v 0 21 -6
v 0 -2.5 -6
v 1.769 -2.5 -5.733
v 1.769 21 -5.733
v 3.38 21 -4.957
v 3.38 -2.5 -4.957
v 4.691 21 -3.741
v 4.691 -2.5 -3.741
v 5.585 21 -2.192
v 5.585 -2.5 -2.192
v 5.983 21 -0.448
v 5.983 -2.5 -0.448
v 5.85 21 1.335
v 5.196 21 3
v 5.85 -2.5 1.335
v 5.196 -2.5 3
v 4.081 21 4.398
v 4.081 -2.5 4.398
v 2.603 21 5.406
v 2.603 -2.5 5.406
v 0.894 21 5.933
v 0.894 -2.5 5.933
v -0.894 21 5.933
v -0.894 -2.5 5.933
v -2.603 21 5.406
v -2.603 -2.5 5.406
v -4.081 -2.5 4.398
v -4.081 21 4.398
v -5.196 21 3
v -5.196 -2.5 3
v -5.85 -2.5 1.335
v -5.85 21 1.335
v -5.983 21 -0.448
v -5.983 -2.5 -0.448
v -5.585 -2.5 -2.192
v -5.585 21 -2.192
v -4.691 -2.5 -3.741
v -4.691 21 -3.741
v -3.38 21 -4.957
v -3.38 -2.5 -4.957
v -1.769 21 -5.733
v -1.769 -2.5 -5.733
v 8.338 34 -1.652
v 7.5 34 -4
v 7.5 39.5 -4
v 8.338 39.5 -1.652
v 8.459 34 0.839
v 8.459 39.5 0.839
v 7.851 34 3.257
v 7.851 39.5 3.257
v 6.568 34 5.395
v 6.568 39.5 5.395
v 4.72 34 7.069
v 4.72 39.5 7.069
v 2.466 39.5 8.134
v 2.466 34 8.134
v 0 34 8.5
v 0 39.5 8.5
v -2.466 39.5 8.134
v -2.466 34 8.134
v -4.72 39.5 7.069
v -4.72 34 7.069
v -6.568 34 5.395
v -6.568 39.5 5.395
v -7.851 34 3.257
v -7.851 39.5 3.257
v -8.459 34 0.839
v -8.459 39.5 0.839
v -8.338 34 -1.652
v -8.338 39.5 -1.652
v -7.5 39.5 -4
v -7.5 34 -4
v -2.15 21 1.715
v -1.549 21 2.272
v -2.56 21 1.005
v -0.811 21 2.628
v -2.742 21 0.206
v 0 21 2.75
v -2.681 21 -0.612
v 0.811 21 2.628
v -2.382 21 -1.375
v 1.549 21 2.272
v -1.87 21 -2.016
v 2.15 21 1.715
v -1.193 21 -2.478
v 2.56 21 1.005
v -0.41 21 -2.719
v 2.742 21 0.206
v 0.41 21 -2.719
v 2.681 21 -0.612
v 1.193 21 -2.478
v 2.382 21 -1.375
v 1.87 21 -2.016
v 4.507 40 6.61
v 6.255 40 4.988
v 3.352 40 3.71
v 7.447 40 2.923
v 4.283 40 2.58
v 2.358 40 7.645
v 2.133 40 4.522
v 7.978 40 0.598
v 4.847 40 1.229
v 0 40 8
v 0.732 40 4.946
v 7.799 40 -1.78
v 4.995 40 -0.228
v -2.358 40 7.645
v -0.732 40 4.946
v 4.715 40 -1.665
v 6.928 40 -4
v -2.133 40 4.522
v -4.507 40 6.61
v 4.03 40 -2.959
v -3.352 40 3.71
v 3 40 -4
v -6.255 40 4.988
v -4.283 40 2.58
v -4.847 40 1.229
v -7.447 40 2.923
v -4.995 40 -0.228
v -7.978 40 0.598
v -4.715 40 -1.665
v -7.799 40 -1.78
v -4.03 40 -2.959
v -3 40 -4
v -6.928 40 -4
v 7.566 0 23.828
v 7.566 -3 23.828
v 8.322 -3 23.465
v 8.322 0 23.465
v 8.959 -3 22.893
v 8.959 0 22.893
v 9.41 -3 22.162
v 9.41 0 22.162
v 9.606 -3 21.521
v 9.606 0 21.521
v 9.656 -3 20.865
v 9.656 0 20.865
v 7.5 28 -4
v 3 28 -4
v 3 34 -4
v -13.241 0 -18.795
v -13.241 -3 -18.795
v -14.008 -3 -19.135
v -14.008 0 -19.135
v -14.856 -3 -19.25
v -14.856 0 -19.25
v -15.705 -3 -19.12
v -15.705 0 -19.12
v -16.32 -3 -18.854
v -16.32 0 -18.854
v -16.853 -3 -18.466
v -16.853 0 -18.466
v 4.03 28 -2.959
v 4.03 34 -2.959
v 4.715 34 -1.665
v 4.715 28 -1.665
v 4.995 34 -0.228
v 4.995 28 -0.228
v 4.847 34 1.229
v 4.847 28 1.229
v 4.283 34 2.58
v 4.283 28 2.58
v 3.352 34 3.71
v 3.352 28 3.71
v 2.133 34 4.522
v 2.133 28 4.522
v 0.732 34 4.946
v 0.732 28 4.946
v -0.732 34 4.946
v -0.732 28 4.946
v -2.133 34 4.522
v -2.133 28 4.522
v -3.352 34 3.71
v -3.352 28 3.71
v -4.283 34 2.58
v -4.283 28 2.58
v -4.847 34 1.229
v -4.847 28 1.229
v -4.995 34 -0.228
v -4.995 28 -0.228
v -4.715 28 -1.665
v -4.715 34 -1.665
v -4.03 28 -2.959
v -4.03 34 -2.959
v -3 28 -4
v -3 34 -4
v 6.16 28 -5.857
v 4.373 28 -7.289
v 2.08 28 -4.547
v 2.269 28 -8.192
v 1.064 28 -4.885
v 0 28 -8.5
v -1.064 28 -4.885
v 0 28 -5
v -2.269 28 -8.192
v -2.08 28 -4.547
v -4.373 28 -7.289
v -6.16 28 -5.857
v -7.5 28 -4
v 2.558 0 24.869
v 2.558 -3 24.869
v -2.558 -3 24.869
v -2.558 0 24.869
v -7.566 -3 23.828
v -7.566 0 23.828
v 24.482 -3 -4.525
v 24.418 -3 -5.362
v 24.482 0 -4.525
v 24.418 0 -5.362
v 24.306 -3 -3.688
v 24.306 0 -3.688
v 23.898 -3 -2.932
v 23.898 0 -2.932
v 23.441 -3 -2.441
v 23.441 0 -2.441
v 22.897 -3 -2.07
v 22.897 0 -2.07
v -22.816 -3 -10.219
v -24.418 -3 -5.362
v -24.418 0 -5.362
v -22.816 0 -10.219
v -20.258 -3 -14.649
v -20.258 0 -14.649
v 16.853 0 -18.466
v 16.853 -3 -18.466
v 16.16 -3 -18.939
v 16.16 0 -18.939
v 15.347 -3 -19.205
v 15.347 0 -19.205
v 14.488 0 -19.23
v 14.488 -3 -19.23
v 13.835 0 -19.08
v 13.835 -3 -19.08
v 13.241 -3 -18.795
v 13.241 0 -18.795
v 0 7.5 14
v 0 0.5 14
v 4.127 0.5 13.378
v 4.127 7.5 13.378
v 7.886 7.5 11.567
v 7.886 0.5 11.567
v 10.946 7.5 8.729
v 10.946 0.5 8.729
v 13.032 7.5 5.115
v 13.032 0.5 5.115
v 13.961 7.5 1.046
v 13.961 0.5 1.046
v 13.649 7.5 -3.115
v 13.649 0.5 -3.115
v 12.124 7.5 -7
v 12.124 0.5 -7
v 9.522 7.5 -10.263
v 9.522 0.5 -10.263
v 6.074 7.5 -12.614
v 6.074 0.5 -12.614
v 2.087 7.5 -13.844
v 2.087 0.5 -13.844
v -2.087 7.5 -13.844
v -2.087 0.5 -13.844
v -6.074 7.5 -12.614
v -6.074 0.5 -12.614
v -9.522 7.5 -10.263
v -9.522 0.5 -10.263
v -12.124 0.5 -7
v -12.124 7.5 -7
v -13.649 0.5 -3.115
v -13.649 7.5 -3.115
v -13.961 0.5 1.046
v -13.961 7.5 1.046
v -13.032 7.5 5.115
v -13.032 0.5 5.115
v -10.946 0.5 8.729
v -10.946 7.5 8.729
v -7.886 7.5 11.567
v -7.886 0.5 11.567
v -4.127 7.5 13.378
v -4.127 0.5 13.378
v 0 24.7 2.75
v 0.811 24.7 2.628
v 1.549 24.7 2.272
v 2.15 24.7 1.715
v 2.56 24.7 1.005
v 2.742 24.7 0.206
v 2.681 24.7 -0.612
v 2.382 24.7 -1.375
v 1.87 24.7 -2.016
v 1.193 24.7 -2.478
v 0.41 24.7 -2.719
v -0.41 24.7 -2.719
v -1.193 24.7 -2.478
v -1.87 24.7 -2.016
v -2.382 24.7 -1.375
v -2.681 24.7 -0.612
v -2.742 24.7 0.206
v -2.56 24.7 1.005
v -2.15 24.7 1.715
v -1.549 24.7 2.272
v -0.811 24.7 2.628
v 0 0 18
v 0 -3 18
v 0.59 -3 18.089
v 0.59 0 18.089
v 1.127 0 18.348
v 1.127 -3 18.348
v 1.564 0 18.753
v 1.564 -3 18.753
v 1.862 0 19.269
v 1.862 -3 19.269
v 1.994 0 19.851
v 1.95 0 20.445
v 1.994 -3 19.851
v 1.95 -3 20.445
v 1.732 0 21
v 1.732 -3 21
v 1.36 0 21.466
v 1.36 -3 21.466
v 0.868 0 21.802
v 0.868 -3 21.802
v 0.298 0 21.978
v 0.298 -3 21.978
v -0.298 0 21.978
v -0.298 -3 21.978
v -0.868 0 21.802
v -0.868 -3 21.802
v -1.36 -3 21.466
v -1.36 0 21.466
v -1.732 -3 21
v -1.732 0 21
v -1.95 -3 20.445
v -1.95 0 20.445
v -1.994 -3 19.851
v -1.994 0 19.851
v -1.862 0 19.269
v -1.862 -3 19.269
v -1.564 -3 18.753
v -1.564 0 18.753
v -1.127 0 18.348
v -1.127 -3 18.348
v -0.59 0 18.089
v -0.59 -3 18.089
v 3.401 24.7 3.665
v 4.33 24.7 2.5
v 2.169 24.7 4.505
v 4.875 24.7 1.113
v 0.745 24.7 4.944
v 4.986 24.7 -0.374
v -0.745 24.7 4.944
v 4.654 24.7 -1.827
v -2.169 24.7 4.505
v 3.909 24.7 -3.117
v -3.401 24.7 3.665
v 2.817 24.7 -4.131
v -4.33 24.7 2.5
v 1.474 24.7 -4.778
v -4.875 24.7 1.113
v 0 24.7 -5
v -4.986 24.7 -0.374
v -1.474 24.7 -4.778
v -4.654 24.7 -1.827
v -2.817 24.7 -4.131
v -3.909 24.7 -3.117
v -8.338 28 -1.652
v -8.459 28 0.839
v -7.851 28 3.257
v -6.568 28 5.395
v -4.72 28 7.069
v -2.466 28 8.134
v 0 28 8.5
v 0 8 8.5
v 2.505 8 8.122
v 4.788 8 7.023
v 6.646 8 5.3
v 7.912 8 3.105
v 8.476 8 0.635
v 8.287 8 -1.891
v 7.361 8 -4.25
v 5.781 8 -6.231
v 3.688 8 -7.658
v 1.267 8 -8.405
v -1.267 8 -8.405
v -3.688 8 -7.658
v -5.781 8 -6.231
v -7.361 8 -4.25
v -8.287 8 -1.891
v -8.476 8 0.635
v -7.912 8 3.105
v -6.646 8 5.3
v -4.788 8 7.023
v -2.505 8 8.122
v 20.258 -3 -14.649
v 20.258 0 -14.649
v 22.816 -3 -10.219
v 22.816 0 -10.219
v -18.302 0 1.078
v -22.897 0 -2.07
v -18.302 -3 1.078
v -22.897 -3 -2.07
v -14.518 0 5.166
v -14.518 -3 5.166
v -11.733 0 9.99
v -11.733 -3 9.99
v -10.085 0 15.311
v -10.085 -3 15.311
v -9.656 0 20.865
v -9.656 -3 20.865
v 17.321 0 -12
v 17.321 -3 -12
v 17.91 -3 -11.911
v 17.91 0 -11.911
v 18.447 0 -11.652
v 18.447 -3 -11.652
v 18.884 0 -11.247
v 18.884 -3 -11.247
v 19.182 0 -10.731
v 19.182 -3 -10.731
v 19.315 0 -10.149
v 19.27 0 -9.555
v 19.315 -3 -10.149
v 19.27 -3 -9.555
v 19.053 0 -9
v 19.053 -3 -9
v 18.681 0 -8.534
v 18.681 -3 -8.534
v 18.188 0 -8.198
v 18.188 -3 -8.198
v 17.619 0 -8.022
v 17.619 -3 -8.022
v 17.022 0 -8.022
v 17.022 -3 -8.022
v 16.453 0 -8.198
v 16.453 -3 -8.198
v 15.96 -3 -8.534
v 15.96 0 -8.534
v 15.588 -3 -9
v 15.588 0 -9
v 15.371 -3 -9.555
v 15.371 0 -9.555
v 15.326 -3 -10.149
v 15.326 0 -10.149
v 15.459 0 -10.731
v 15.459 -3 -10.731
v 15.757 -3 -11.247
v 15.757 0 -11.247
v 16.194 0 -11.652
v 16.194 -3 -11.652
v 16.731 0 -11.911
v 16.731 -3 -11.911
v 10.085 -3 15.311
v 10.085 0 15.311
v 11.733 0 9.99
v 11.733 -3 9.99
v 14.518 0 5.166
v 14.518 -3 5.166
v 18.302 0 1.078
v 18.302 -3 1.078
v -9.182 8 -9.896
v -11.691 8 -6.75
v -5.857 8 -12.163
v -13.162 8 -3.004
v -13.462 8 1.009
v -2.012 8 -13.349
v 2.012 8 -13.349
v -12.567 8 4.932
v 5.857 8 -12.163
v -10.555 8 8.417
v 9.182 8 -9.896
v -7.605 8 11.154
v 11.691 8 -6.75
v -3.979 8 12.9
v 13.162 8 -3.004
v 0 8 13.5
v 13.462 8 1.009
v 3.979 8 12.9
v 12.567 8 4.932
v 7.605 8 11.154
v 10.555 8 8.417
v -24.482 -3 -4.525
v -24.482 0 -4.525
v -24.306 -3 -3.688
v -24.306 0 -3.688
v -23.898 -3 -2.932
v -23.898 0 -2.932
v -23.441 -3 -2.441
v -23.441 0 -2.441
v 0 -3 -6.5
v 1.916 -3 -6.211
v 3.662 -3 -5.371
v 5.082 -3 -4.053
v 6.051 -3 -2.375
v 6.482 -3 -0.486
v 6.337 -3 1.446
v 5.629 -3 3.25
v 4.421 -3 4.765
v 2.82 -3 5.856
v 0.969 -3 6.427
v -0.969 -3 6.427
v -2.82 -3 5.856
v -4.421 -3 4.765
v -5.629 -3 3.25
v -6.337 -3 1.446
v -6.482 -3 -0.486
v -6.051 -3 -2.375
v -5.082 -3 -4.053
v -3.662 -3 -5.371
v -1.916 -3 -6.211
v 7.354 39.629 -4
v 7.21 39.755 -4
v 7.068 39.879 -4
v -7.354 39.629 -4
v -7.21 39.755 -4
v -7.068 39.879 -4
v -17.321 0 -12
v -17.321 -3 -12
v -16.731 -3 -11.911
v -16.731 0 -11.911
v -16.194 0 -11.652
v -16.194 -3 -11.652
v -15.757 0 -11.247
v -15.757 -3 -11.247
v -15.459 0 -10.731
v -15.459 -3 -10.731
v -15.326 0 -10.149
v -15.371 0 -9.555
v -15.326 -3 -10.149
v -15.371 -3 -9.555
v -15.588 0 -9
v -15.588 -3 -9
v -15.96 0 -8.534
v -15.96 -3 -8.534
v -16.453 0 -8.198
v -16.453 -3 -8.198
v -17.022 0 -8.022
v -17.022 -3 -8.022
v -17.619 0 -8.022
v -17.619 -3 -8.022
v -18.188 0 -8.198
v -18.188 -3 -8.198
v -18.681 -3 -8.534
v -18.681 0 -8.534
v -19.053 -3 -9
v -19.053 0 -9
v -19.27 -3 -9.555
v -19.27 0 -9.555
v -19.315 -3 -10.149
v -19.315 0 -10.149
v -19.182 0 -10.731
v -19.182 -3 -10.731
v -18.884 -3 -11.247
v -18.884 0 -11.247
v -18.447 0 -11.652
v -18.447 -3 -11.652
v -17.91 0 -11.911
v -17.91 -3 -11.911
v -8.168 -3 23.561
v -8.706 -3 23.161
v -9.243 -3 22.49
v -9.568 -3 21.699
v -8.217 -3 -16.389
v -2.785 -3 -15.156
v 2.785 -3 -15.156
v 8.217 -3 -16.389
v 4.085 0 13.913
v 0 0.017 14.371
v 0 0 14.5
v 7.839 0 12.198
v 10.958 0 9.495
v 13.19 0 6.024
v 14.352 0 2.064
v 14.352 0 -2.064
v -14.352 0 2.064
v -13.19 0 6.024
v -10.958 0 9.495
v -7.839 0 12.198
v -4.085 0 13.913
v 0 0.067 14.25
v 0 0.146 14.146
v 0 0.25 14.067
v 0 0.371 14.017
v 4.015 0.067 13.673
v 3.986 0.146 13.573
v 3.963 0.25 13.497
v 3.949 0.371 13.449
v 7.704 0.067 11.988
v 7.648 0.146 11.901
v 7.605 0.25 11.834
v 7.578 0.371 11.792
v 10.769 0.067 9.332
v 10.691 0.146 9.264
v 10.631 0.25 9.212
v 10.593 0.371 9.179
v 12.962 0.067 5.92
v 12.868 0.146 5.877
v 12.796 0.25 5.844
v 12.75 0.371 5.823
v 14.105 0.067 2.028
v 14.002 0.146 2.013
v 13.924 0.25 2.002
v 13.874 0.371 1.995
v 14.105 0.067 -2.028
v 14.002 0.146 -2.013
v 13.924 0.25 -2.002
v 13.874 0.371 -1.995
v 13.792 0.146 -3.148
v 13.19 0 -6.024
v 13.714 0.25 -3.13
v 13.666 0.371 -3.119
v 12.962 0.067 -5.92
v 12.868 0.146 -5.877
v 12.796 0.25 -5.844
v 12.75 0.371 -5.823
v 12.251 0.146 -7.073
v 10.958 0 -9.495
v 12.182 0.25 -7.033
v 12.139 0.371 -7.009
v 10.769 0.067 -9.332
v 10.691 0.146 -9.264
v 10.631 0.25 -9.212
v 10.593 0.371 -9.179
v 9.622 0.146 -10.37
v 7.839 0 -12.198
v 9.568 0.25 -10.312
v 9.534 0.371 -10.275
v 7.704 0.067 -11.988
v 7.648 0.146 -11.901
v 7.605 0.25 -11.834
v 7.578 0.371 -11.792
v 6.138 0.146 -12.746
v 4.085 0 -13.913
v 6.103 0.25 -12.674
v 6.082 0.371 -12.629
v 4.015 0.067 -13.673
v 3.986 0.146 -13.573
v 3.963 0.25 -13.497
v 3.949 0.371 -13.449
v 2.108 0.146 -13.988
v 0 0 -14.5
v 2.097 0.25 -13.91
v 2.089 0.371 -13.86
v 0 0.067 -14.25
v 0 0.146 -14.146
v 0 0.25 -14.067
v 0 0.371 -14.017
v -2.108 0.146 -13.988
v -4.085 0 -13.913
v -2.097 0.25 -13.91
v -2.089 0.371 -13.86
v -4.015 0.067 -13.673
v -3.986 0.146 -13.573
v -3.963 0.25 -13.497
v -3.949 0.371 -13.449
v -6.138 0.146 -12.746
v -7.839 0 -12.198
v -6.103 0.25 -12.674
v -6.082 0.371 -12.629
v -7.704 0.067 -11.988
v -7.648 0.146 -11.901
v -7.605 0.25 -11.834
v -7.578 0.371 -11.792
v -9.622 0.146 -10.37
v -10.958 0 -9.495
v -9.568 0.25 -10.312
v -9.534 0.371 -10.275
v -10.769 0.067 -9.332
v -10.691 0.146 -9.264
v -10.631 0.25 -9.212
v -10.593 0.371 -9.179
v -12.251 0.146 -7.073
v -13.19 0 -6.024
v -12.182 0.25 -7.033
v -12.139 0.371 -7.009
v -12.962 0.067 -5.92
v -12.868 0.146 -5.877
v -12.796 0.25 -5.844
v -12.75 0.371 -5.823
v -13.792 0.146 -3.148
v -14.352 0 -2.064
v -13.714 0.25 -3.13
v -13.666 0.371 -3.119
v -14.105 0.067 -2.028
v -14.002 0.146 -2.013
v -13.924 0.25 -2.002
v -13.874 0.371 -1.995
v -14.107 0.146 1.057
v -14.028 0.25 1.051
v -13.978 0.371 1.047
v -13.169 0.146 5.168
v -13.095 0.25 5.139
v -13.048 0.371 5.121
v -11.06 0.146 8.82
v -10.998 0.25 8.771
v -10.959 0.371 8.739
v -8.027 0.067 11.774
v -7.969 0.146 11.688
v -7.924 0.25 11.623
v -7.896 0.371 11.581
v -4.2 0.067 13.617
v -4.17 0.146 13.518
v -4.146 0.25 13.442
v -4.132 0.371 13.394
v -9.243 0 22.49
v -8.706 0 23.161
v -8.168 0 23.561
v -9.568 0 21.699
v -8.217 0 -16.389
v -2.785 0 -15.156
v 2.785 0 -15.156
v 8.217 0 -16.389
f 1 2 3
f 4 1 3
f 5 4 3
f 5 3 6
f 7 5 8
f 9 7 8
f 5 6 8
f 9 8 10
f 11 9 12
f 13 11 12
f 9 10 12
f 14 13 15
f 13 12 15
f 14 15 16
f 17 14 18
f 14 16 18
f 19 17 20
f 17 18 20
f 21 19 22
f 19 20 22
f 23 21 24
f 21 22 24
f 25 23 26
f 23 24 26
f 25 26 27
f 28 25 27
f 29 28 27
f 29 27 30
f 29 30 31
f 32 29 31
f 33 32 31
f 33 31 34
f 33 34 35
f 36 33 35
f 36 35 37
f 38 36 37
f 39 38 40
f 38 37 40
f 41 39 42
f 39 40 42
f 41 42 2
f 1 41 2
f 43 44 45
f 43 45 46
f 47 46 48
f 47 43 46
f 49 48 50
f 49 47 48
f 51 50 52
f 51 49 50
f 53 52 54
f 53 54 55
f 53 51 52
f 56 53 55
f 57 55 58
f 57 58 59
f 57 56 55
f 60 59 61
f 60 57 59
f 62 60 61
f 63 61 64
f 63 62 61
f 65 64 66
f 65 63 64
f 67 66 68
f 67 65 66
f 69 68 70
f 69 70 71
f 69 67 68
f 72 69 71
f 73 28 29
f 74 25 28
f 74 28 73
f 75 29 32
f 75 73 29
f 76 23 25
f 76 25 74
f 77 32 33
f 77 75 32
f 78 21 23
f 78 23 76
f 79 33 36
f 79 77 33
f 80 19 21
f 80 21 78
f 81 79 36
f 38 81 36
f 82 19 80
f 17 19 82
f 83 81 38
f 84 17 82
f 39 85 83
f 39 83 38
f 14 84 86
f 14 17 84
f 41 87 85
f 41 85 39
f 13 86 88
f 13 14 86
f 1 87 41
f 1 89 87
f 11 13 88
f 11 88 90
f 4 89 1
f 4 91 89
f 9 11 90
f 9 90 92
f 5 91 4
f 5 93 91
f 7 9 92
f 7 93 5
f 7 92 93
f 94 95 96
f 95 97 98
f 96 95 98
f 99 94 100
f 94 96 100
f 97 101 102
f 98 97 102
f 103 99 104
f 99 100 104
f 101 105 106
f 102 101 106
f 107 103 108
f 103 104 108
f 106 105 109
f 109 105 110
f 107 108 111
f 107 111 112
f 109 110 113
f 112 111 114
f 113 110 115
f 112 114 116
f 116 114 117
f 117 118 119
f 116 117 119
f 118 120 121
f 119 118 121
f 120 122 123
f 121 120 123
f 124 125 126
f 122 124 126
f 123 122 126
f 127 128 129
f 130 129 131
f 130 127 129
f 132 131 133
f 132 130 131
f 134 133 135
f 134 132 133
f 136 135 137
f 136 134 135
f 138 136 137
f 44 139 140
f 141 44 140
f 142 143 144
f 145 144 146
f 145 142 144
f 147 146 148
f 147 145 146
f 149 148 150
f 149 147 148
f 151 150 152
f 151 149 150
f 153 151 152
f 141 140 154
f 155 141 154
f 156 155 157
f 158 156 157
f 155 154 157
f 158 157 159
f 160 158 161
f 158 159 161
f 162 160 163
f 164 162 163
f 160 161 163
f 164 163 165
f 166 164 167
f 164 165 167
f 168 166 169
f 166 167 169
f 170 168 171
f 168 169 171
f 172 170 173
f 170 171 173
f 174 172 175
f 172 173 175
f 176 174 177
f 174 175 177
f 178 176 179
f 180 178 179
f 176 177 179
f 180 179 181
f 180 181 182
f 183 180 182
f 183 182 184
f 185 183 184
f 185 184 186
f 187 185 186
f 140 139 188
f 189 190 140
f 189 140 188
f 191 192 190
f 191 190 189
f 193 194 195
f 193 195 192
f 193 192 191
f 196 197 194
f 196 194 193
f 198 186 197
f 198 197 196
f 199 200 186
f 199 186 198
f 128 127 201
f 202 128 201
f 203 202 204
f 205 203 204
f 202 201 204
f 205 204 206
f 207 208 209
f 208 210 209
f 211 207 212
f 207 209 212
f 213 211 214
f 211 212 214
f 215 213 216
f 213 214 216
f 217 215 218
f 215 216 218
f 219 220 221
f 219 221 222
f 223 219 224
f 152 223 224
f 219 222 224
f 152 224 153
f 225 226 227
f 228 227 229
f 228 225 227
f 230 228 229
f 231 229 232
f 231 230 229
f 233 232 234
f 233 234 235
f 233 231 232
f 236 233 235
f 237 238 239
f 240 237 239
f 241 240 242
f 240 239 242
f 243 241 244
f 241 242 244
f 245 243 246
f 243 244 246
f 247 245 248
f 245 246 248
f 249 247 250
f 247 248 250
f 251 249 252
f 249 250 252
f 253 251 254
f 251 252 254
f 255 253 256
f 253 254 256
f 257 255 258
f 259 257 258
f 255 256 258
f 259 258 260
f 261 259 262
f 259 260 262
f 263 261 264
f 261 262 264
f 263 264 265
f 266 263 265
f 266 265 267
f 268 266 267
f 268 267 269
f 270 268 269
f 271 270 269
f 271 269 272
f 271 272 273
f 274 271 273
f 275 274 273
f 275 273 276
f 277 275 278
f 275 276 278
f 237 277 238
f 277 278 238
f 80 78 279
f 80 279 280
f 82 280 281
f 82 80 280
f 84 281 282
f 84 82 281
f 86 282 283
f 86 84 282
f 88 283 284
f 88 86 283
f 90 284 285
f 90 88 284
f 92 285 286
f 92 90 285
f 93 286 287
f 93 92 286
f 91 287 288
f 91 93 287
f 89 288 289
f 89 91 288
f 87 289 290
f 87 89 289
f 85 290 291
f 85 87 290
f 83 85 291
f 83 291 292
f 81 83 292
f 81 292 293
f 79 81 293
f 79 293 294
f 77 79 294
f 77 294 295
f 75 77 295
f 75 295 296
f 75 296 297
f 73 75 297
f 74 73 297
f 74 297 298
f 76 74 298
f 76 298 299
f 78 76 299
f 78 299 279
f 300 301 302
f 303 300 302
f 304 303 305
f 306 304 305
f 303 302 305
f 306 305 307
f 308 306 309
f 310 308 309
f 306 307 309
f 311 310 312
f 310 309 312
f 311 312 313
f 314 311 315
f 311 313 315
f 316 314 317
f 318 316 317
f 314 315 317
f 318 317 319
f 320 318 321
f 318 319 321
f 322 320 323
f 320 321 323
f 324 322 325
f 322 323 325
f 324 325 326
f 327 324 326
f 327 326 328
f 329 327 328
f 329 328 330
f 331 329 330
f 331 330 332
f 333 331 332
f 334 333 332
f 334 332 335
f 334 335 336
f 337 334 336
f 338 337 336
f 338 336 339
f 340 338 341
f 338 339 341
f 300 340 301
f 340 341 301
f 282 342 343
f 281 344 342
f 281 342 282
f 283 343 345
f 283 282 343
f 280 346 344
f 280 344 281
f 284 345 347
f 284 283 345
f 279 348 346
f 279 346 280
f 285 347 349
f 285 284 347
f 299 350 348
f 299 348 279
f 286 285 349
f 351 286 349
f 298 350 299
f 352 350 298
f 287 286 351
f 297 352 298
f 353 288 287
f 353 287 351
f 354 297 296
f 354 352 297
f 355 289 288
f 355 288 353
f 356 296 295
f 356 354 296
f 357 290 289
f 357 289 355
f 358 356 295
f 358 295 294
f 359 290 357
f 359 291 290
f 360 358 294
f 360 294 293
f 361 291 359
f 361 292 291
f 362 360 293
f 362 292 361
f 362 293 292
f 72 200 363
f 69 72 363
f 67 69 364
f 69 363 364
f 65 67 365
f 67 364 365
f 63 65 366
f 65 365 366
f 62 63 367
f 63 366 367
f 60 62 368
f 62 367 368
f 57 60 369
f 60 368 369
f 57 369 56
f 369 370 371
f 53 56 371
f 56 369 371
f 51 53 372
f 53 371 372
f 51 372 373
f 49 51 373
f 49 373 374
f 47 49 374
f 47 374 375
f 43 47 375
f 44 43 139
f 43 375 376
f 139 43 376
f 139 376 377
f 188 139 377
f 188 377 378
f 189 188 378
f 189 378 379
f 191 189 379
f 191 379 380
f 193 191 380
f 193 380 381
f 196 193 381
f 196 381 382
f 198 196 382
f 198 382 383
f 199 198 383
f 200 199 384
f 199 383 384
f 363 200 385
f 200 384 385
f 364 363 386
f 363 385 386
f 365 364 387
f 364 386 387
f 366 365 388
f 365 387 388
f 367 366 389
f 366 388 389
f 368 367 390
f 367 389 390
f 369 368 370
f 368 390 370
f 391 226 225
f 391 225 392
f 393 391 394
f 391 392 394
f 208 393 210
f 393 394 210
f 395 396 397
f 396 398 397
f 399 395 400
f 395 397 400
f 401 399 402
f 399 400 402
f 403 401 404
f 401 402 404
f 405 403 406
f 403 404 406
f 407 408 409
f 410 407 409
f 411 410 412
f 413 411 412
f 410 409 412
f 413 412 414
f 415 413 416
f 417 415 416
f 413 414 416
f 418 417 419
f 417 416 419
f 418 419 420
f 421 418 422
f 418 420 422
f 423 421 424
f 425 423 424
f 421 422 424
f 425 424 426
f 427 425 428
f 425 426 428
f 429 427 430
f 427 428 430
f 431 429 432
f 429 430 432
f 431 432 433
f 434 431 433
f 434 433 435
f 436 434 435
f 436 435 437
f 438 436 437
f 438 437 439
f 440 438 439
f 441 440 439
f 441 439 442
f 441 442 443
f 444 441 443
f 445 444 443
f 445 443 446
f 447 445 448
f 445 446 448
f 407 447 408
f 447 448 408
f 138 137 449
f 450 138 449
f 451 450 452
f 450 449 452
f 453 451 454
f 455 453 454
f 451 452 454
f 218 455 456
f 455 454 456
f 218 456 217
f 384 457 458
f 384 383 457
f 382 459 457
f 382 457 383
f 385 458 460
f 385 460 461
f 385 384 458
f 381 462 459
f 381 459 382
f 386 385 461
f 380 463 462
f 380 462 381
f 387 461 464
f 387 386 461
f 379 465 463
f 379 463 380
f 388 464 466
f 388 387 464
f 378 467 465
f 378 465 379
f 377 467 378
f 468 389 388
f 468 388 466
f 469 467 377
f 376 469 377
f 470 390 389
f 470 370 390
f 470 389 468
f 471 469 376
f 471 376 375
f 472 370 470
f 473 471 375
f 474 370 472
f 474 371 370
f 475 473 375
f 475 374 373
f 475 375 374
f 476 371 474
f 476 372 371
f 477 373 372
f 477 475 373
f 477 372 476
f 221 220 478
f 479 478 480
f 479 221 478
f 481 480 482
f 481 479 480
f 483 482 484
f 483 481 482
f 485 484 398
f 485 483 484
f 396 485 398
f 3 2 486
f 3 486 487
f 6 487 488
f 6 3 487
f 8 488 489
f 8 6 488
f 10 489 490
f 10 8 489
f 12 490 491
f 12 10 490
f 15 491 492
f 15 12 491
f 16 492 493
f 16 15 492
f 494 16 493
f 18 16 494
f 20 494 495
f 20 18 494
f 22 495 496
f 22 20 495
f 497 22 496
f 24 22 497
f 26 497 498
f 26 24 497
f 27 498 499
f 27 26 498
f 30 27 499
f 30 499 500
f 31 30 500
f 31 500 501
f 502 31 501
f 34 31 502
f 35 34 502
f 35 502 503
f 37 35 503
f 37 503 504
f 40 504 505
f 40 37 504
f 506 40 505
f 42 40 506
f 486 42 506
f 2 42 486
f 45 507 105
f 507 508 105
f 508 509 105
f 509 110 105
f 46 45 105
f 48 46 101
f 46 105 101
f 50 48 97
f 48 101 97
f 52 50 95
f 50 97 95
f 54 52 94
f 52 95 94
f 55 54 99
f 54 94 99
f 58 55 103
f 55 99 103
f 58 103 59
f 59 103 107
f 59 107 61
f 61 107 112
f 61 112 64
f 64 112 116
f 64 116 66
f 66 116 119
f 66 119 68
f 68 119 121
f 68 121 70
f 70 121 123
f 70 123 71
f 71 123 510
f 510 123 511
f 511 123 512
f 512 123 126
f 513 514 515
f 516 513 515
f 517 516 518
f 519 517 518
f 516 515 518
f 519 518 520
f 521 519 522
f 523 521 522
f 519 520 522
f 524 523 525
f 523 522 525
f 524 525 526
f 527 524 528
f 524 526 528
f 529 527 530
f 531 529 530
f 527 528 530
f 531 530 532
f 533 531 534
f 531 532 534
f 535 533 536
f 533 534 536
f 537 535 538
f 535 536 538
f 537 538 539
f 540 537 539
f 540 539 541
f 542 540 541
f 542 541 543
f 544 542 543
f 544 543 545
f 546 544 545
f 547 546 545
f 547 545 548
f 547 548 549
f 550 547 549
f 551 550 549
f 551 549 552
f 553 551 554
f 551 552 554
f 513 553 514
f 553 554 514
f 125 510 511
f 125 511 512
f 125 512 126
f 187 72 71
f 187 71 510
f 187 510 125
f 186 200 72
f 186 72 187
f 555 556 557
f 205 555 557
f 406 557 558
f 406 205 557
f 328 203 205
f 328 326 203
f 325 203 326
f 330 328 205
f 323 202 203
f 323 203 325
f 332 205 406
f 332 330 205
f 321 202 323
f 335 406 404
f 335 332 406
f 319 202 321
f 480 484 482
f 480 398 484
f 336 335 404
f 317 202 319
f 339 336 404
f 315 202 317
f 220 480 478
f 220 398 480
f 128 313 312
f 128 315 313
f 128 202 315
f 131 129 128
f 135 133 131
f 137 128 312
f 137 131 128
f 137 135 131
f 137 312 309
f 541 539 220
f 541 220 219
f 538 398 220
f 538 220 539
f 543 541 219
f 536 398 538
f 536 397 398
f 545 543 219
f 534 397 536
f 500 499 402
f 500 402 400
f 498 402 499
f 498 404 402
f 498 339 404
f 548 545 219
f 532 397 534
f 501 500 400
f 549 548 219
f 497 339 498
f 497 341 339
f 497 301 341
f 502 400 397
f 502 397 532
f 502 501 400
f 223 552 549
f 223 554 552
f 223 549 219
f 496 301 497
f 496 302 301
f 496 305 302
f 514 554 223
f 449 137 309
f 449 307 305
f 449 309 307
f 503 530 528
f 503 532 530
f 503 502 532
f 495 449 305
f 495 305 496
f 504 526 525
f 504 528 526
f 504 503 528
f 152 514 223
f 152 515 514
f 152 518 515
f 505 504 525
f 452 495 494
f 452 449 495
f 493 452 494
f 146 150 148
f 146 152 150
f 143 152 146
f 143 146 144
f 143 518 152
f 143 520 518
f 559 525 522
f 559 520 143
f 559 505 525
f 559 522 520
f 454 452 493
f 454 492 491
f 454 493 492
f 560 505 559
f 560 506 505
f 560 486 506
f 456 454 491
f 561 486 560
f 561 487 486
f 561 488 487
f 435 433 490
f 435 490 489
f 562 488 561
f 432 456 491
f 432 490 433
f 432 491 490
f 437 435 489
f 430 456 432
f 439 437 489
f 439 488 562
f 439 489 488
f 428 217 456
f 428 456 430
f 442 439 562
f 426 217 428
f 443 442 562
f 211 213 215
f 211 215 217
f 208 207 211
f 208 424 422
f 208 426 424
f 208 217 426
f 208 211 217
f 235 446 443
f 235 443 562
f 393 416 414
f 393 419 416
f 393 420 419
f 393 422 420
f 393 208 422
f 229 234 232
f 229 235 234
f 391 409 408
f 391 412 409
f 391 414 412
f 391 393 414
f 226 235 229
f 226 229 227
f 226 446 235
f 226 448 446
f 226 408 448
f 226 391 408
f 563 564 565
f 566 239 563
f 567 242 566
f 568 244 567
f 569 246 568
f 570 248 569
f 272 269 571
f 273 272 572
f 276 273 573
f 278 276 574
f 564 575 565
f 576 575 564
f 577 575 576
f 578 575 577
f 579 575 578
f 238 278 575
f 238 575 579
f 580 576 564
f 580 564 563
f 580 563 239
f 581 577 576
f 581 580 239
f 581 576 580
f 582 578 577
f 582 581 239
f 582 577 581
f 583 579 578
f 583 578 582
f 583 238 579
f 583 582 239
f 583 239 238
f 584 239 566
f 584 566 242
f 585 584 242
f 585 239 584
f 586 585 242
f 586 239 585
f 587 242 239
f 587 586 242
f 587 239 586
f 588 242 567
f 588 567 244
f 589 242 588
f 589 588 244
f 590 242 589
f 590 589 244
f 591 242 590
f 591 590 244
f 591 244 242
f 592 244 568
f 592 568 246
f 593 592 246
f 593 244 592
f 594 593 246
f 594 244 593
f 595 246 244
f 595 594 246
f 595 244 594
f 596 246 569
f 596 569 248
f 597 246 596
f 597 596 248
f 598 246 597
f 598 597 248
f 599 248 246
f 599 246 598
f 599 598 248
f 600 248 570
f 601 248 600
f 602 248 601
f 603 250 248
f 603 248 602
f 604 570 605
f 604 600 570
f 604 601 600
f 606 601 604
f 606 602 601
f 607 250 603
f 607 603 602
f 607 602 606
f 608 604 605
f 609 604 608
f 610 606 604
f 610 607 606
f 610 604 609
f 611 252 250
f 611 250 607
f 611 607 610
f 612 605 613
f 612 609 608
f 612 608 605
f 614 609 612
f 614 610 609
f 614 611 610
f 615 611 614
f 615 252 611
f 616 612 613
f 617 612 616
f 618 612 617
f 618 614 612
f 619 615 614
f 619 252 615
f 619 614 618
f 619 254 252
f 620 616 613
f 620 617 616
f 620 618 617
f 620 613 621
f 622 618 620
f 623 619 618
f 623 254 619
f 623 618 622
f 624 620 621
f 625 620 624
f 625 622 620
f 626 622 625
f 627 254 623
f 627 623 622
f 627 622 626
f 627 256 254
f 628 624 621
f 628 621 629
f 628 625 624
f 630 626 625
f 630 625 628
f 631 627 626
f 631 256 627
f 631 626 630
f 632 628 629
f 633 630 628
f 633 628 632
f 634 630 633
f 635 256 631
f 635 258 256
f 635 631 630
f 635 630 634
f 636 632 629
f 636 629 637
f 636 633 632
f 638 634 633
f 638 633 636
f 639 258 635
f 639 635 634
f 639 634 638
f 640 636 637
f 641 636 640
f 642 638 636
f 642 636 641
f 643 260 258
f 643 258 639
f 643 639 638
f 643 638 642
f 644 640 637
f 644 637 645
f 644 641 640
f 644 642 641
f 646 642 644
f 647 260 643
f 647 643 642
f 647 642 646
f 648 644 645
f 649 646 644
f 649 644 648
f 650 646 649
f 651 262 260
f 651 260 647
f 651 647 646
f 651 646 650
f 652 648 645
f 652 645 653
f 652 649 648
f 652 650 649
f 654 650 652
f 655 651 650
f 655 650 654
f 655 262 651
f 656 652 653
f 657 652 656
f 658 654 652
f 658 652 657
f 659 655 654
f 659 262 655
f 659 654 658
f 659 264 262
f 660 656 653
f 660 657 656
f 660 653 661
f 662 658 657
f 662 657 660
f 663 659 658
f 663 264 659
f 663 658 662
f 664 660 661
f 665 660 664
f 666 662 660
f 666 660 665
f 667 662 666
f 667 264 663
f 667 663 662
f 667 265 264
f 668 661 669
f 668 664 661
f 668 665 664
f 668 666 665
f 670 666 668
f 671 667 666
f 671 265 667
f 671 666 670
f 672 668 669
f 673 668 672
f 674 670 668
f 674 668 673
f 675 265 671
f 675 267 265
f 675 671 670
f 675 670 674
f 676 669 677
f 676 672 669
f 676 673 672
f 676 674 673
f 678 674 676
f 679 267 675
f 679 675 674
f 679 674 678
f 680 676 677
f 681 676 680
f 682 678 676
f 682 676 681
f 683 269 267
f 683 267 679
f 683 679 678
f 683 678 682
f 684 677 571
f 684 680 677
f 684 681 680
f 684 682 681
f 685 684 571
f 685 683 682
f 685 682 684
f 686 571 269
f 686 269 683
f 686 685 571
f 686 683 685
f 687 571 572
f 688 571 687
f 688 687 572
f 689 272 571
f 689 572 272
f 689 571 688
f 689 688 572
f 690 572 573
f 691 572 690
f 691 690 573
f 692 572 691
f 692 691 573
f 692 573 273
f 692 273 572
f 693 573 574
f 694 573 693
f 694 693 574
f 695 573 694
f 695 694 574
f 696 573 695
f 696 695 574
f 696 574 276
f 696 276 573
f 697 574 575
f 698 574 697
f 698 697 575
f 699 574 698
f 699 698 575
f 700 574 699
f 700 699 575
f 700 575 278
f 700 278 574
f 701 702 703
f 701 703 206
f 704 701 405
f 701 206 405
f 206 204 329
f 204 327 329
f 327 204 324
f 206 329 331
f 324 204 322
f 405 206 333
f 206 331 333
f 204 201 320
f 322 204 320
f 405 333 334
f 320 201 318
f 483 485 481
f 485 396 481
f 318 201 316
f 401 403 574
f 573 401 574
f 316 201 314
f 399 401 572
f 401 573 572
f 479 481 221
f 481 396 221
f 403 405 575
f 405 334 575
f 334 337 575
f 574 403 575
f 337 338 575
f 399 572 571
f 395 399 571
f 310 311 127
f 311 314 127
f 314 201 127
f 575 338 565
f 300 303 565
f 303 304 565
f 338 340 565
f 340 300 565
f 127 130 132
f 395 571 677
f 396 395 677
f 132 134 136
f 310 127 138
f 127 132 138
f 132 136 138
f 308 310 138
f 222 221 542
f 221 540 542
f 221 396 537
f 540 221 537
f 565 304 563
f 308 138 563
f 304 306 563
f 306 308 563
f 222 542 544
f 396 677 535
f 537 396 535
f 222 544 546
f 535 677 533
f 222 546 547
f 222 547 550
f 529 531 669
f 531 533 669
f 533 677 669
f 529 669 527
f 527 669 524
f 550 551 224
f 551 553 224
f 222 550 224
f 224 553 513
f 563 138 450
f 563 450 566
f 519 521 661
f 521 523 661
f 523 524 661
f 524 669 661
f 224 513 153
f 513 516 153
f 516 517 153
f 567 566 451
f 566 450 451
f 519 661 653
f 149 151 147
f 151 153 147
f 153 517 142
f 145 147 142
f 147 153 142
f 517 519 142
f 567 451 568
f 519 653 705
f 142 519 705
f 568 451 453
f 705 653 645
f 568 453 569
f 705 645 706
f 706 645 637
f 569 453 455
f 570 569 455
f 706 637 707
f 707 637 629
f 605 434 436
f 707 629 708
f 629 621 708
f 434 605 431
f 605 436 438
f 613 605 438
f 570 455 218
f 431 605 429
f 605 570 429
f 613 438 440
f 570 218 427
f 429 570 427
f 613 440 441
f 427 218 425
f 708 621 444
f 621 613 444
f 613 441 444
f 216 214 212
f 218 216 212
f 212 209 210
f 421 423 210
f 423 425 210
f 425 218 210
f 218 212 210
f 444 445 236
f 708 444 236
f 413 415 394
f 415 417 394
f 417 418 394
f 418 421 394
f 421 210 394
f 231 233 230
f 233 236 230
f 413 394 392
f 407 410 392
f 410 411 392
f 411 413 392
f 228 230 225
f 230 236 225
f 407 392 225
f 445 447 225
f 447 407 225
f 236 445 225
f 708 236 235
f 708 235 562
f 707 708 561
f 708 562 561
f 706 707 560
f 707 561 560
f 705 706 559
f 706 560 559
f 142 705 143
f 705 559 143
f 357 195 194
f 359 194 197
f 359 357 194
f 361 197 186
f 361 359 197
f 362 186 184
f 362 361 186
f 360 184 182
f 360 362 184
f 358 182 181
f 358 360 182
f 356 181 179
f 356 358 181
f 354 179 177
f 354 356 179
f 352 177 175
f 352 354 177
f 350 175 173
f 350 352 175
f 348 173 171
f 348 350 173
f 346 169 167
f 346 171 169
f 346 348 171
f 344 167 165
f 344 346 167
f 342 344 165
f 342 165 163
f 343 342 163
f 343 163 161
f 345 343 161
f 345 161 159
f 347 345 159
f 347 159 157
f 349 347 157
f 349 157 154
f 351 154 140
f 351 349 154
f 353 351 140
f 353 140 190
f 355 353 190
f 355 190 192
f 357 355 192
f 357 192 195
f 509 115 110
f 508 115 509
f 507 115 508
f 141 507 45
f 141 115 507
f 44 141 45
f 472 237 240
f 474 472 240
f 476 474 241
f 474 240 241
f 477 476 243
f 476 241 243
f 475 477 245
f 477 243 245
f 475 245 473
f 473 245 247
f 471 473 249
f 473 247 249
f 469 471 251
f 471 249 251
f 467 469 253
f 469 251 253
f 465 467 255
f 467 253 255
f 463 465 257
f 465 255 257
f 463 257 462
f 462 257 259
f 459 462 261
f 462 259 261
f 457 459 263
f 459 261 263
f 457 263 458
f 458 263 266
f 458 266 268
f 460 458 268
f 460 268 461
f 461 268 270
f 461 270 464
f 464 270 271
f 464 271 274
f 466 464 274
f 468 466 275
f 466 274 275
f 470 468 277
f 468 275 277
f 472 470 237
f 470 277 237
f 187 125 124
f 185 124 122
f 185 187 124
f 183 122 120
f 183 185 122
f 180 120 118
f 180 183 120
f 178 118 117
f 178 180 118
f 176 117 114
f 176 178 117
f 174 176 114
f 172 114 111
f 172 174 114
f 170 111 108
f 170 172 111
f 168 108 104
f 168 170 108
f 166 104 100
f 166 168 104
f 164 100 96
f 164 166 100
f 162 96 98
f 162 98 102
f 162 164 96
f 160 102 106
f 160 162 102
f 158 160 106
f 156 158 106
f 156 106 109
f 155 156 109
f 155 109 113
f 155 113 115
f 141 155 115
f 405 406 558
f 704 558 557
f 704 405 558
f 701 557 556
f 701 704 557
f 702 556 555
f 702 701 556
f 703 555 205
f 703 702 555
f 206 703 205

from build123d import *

# Parameters (mm, degrees)
SKETCH_2_R          = 14
EXTRUDE_1_DEPTH     = 8
SKETCH_3_R          = 8.5
EXTRUDE_2_DEPTH     = 20
SKETCH_4_R          = 5
CUT_EXTRUDE_1_DEPTH = 45
EXTRUDE_START       = -7
SKETCH_5_R          = 5
SKETCH_5_R_2        = 2.75
EXTRUDE_3_DEPTH     = 7
CUT_EXTRUDE_START   = -3.3
SKETCH_6_R          = 5
SKETCH_6_R_2        = 2.75
CUT_EXTRUDE_2_DEPTH = 3.3
EXTRUDE_4_DEPTH     = 6
SKETCH_9_R          = 6
CUT_EXTRUDE_5_DEPTH = 21
CHAMFER_5_SIZE      = 0.5
SKETCH_21_R         = 25
EXTRUDE_5_DEPTH     = 3
SKETCH_22_R         = 2.0000000000000004
SKETCH_22_R_2       = 25
SKETCH_22_R_3       = 2.0000000000000027
SKETCH_22_R_4       = 1.9999999999999996
SKETCH_22_R_5       = 25.000000000000004
CUT_EXTRUDE_7_DEPTH = 3
FILLET_2_R          = 3
FILLET_3_R          = 0.5
SKETCH_23_R         = 6
CUT_EXTRUDE_8_DEPTH = 3
CHAMFER_7_SIZE      = 0.5
EXTRUDE_6_DEPTH     = 6
CHAMFER_8_SIZE      = 0.5


with BuildPart() as part:
    # 草图2 → 凸台-拉伸1 (new body)
    with BuildSketch(Plane(origin=(0, 0, 0), x_dir=(1, 0, 0), z_dir=(0, 1, 0))):
        Circle(SKETCH_2_R)
    extrude(amount=EXTRUDE_1_DEPTH)

    # 草图3 → 凸台-拉伸2 (add)
    with BuildSketch(Plane(origin=(0, 8, 0), x_dir=(1, 0, 0), z_dir=(0, 1, 0))):
        Circle(SKETCH_3_R)
    extrude(amount=EXTRUDE_2_DEPTH)

    # 草图4 → 切除-拉伸1 (cut)
    with BuildSketch(Plane.XZ):
        Circle(SKETCH_4_R)
    extrude(amount=-CUT_EXTRUDE_1_DEPTH, mode=Mode.SUBTRACT)

    # 草图5 → 凸台-拉伸3 (add)
    with BuildSketch(Plane(origin=(0, 28, 0), x_dir=(1, 0, 0), z_dir=(0, 1, 0)).offset(EXTRUDE_START)):
        Circle(SKETCH_5_R)
        Circle(SKETCH_5_R_2, mode=Mode.SUBTRACT)
    extrude(amount=EXTRUDE_3_DEPTH)

    # 草图6 → 切除-拉伸2 (cut)
    with BuildSketch(Plane(origin=(0, 28, 0), x_dir=(1, 0, 0), z_dir=(0, 1, 0)).offset(CUT_EXTRUDE_START)):
        Circle(SKETCH_6_R)
        Circle(SKETCH_6_R_2, mode=Mode.SUBTRACT)
    extrude(amount=CUT_EXTRUDE_2_DEPTH, mode=Mode.SUBTRACT)

    # 草图8 → 凸台-拉伸4 (add)
    with BuildSketch(Plane(origin=(0, 28, 0), x_dir=(1, 0, 0), z_dir=(0, 1, 0))):
        with BuildLine():
            Line((-3.000000000000001, 4), (-7.500000000000001, 4))
            ThreePointArc((-7.500000000000001, 4), (8.9e-16, -8.5), (7.5, 4.000000000000002))
            Line((7.500000000000001, 4), (3.0000000000000027, 4))
            ThreePointArc((3.0000000000000018, 3.9999999999999982), (4.4721359549995805, 2.236067977499788), (5, -2.16e-15))
            ThreePointArc((5, -2.16e-15), (-2.2360679774997885, -4.472135954999579), (-3.000000000000001, 3.999999999999998))
        make_face()
    extrude(amount=EXTRUDE_4_DEPTH)

    # 草图9 → 切除-拉伸5 (cut)
    with BuildSketch(Plane.XZ):
        Circle(SKETCH_9_R)
    extrude(amount=-CUT_EXTRUDE_5_DEPTH, mode=Mode.SUBTRACT)

    # 倒角5
    chamfer_5_edges = [part.edges().sort_by_distance(p)[0] for p in [
        (-14, 8, -1.71e-15),
    ]]
    chamfer(chamfer_5_edges, length=CHAMFER_5_SIZE)

    # 草图21 → 凸台-拉伸5 (add)
    with BuildSketch(Plane.XZ):
        Circle(SKETCH_21_R)
    extrude(amount=EXTRUDE_5_DEPTH)

    # 草图22 → 切除-拉伸7 (cut)
    with BuildSketch(Plane.XZ.offset(3)):
        with Locations((0, 20)):
            Circle(SKETCH_22_R)
        with Locations((0, -40)):
            Circle(SKETCH_22_R_2)
        with Locations((17.320508075688732, -10.00000000000008)):
            Circle(SKETCH_22_R_3)
        with Locations((-34.641016151377464, 20.000000000000163)):
            Circle(SKETCH_22_R_2)
        with Locations((-17.32050807568886, -9.999999999999838)):
            Circle(SKETCH_22_R_4)
        with Locations((34.64101615137774, 19.999999999999677)):
            Circle(SKETCH_22_R_5)
    extrude(amount=-CUT_EXTRUDE_7_DEPTH, mode=Mode.SUBTRACT)

    # 圆角2
    fillet_2_edges = [part.edges().sort_by_distance(p)[0] for p in [
        (-24.820508075688785, -1.5, -2.9903810567664557),
        (-14.999999999999996, -1.5, -20),
        (14.999999999999996, -1.5, -20),
        (24.820508075688743, -1.5, -2.990381056766811),
        (9.820508075688991, -1.5, 22.990381056766484),
        (-9.820508075688677, -1.5, 22.99038105676662),
    ]]
    fillet(fillet_2_edges, radius=FILLET_2_R)

    # 圆角3
    fillet_3_edges = [part.edges().sort_by_distance(p)[0] for p in [
        (-14, 0, -1.71e-15),
    ]]
    fillet(fillet_3_edges, radius=FILLET_3_R)

    # 草图23 → 切除-拉伸8 (cut)
    with BuildSketch(Plane.XZ.offset(3)):
        Circle(SKETCH_23_R)
    extrude(amount=-CUT_EXTRUDE_8_DEPTH, mode=Mode.SUBTRACT)

    # 倒角7
    chamfer_7_edges = [part.edges().sort_by_distance(p)[0] for p in [
        (-6, -3, 7.3e-16),
    ]]
    chamfer(chamfer_7_edges, length=CHAMFER_7_SIZE)

    # 草图24 → 凸台-拉伸6 (add)
    with BuildSketch(Plane(origin=(0, 34, 0), x_dir=(1, 0, 0), z_dir=(0, 1, 0))):
        with BuildLine():
            Line((-7.500000000000001, 4), (-3.000000000000001, 3.9999999999999982))
            ThreePointArc((-3.000000000000001, 3.9999999999999982), (-9.2e-16, -4.999999999999999), (3.000000000000001, 3.9999999999999982))
            Line((3.000000000000001, 3.9999999999999982), (7.500000000000001, 4))
            ThreePointArc((7.500000000000001, 4), (-1.56e-15, -8.5), (-7.500000000000001, 4))
        make_face()
    extrude(amount=EXTRUDE_6_DEPTH)

    # 倒角8
    chamfer_8_edges = [part.edges().sort_by_distance(p)[0] for p in [
        (-8.9e-16, 40, 8.5),
    ]]
    chamfer(chamfer_8_edges, length=CHAMFER_8_SIZE)


solid = part.part
